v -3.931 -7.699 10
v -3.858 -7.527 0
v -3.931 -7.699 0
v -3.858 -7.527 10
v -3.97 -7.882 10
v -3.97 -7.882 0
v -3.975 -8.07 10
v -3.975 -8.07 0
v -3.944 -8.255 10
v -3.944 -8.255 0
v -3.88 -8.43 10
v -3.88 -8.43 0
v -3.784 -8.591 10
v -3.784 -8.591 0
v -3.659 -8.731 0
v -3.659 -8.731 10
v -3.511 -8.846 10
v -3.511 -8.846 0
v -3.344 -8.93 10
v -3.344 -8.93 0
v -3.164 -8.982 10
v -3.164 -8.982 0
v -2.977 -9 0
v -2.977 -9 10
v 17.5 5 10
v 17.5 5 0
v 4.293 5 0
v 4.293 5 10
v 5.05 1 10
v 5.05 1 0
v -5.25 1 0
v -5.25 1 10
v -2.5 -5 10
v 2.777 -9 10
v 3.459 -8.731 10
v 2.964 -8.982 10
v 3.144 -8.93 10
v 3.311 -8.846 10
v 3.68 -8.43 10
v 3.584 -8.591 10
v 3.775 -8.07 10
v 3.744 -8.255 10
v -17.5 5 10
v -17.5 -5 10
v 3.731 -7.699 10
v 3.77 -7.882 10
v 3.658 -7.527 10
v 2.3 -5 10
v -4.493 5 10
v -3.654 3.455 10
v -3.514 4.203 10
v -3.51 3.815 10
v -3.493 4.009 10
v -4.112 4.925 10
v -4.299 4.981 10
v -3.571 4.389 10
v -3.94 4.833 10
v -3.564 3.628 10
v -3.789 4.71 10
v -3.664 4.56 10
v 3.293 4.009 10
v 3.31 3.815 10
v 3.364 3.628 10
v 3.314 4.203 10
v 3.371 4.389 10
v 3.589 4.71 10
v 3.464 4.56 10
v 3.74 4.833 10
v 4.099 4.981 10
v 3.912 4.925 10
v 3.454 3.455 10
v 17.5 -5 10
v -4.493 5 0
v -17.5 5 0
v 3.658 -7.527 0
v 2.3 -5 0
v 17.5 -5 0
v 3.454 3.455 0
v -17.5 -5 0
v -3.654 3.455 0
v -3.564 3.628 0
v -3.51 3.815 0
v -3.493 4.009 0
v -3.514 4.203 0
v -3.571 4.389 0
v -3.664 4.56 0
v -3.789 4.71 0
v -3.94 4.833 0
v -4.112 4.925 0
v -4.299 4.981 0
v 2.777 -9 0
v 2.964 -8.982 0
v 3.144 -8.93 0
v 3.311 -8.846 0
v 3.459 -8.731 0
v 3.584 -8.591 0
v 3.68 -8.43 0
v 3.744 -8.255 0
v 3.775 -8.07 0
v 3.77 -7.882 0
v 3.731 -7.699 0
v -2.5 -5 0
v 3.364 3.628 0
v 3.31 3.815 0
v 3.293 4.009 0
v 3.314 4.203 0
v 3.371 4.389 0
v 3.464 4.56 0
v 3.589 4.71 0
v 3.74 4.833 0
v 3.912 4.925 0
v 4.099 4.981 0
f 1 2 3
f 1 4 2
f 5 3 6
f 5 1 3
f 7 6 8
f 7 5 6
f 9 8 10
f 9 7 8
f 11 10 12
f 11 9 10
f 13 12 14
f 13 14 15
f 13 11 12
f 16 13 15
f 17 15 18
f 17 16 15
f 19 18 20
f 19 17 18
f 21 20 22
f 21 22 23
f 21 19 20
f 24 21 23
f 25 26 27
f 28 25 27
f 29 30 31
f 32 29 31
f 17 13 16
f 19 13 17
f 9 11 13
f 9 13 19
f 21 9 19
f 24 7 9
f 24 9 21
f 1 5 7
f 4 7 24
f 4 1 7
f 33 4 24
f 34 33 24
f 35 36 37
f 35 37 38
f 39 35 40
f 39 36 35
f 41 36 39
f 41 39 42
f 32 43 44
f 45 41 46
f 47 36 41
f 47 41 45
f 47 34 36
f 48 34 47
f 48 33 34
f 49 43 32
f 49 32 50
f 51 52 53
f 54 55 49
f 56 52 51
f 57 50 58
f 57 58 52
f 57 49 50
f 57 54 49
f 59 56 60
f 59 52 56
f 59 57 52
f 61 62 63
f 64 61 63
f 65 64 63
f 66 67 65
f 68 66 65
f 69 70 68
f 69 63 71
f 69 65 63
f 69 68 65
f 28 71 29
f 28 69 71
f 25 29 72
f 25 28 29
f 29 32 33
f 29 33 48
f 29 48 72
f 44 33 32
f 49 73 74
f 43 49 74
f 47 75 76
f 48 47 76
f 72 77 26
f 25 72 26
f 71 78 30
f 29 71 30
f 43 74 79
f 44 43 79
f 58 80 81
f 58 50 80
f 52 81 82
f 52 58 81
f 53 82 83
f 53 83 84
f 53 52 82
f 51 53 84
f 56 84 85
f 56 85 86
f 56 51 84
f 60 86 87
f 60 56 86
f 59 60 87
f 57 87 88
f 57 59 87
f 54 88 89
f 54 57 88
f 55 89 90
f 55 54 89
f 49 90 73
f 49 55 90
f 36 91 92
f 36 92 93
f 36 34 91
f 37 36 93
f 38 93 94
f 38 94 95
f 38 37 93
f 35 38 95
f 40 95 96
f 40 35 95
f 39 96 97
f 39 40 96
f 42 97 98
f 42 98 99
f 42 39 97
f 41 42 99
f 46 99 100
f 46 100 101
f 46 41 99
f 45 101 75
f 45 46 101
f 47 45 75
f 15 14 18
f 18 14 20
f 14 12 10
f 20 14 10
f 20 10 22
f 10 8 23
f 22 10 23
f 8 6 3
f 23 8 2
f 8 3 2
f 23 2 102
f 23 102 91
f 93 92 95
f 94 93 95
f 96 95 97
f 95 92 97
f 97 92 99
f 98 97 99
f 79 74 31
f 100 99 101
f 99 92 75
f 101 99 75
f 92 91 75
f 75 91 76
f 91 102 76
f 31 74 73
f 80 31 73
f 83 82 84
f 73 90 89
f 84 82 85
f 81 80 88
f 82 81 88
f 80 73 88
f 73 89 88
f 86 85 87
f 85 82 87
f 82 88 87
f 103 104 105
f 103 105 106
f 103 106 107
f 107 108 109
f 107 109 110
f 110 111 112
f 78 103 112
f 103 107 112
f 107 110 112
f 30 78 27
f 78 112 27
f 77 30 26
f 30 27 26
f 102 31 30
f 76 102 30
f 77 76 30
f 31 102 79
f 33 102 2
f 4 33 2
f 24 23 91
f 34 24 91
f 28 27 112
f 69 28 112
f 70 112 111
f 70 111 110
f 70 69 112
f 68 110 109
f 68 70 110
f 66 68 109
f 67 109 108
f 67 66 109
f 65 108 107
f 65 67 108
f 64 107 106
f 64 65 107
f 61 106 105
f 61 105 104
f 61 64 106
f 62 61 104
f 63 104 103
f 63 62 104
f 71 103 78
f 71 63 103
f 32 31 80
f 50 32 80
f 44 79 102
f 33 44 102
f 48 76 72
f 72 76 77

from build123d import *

# Parameters (mm, degrees)
F1_DEPTH = 10
F2_R     = 1


# Not quite as in the source:
# - a feature names something its author has since deleted; it is built from what else it names


with BuildPart() as f1:
    # F0 (on Top) → F1 (new body)
    with BuildSketch(Plane.XY):
        Polygon((2.3, -5), (17.5, -5), (17.5, 5), (2.45, 5), (5.05, 1), (-5.25, 1), (-2.65, 5), (-17.5, 5), (-17.5, -5), (-2.5, -5), align=None)
        Polygon((4.45, -9), (2.3, -5), (-2.5, -5), (-4.65, -9), align=None)
    extrude(amount=F1_DEPTH)

    # F2
    f2_edges = [f1.edges().sort_by_distance(p)[0] for p in [
        (-2.65, 5, 5),
        (2.45, 5, 5),
        (4.45, -9, 5),
        (-4.65, -9, 5),
    ]]
    fillet(f2_edges, radius=F2_R)


solid = f1.part
